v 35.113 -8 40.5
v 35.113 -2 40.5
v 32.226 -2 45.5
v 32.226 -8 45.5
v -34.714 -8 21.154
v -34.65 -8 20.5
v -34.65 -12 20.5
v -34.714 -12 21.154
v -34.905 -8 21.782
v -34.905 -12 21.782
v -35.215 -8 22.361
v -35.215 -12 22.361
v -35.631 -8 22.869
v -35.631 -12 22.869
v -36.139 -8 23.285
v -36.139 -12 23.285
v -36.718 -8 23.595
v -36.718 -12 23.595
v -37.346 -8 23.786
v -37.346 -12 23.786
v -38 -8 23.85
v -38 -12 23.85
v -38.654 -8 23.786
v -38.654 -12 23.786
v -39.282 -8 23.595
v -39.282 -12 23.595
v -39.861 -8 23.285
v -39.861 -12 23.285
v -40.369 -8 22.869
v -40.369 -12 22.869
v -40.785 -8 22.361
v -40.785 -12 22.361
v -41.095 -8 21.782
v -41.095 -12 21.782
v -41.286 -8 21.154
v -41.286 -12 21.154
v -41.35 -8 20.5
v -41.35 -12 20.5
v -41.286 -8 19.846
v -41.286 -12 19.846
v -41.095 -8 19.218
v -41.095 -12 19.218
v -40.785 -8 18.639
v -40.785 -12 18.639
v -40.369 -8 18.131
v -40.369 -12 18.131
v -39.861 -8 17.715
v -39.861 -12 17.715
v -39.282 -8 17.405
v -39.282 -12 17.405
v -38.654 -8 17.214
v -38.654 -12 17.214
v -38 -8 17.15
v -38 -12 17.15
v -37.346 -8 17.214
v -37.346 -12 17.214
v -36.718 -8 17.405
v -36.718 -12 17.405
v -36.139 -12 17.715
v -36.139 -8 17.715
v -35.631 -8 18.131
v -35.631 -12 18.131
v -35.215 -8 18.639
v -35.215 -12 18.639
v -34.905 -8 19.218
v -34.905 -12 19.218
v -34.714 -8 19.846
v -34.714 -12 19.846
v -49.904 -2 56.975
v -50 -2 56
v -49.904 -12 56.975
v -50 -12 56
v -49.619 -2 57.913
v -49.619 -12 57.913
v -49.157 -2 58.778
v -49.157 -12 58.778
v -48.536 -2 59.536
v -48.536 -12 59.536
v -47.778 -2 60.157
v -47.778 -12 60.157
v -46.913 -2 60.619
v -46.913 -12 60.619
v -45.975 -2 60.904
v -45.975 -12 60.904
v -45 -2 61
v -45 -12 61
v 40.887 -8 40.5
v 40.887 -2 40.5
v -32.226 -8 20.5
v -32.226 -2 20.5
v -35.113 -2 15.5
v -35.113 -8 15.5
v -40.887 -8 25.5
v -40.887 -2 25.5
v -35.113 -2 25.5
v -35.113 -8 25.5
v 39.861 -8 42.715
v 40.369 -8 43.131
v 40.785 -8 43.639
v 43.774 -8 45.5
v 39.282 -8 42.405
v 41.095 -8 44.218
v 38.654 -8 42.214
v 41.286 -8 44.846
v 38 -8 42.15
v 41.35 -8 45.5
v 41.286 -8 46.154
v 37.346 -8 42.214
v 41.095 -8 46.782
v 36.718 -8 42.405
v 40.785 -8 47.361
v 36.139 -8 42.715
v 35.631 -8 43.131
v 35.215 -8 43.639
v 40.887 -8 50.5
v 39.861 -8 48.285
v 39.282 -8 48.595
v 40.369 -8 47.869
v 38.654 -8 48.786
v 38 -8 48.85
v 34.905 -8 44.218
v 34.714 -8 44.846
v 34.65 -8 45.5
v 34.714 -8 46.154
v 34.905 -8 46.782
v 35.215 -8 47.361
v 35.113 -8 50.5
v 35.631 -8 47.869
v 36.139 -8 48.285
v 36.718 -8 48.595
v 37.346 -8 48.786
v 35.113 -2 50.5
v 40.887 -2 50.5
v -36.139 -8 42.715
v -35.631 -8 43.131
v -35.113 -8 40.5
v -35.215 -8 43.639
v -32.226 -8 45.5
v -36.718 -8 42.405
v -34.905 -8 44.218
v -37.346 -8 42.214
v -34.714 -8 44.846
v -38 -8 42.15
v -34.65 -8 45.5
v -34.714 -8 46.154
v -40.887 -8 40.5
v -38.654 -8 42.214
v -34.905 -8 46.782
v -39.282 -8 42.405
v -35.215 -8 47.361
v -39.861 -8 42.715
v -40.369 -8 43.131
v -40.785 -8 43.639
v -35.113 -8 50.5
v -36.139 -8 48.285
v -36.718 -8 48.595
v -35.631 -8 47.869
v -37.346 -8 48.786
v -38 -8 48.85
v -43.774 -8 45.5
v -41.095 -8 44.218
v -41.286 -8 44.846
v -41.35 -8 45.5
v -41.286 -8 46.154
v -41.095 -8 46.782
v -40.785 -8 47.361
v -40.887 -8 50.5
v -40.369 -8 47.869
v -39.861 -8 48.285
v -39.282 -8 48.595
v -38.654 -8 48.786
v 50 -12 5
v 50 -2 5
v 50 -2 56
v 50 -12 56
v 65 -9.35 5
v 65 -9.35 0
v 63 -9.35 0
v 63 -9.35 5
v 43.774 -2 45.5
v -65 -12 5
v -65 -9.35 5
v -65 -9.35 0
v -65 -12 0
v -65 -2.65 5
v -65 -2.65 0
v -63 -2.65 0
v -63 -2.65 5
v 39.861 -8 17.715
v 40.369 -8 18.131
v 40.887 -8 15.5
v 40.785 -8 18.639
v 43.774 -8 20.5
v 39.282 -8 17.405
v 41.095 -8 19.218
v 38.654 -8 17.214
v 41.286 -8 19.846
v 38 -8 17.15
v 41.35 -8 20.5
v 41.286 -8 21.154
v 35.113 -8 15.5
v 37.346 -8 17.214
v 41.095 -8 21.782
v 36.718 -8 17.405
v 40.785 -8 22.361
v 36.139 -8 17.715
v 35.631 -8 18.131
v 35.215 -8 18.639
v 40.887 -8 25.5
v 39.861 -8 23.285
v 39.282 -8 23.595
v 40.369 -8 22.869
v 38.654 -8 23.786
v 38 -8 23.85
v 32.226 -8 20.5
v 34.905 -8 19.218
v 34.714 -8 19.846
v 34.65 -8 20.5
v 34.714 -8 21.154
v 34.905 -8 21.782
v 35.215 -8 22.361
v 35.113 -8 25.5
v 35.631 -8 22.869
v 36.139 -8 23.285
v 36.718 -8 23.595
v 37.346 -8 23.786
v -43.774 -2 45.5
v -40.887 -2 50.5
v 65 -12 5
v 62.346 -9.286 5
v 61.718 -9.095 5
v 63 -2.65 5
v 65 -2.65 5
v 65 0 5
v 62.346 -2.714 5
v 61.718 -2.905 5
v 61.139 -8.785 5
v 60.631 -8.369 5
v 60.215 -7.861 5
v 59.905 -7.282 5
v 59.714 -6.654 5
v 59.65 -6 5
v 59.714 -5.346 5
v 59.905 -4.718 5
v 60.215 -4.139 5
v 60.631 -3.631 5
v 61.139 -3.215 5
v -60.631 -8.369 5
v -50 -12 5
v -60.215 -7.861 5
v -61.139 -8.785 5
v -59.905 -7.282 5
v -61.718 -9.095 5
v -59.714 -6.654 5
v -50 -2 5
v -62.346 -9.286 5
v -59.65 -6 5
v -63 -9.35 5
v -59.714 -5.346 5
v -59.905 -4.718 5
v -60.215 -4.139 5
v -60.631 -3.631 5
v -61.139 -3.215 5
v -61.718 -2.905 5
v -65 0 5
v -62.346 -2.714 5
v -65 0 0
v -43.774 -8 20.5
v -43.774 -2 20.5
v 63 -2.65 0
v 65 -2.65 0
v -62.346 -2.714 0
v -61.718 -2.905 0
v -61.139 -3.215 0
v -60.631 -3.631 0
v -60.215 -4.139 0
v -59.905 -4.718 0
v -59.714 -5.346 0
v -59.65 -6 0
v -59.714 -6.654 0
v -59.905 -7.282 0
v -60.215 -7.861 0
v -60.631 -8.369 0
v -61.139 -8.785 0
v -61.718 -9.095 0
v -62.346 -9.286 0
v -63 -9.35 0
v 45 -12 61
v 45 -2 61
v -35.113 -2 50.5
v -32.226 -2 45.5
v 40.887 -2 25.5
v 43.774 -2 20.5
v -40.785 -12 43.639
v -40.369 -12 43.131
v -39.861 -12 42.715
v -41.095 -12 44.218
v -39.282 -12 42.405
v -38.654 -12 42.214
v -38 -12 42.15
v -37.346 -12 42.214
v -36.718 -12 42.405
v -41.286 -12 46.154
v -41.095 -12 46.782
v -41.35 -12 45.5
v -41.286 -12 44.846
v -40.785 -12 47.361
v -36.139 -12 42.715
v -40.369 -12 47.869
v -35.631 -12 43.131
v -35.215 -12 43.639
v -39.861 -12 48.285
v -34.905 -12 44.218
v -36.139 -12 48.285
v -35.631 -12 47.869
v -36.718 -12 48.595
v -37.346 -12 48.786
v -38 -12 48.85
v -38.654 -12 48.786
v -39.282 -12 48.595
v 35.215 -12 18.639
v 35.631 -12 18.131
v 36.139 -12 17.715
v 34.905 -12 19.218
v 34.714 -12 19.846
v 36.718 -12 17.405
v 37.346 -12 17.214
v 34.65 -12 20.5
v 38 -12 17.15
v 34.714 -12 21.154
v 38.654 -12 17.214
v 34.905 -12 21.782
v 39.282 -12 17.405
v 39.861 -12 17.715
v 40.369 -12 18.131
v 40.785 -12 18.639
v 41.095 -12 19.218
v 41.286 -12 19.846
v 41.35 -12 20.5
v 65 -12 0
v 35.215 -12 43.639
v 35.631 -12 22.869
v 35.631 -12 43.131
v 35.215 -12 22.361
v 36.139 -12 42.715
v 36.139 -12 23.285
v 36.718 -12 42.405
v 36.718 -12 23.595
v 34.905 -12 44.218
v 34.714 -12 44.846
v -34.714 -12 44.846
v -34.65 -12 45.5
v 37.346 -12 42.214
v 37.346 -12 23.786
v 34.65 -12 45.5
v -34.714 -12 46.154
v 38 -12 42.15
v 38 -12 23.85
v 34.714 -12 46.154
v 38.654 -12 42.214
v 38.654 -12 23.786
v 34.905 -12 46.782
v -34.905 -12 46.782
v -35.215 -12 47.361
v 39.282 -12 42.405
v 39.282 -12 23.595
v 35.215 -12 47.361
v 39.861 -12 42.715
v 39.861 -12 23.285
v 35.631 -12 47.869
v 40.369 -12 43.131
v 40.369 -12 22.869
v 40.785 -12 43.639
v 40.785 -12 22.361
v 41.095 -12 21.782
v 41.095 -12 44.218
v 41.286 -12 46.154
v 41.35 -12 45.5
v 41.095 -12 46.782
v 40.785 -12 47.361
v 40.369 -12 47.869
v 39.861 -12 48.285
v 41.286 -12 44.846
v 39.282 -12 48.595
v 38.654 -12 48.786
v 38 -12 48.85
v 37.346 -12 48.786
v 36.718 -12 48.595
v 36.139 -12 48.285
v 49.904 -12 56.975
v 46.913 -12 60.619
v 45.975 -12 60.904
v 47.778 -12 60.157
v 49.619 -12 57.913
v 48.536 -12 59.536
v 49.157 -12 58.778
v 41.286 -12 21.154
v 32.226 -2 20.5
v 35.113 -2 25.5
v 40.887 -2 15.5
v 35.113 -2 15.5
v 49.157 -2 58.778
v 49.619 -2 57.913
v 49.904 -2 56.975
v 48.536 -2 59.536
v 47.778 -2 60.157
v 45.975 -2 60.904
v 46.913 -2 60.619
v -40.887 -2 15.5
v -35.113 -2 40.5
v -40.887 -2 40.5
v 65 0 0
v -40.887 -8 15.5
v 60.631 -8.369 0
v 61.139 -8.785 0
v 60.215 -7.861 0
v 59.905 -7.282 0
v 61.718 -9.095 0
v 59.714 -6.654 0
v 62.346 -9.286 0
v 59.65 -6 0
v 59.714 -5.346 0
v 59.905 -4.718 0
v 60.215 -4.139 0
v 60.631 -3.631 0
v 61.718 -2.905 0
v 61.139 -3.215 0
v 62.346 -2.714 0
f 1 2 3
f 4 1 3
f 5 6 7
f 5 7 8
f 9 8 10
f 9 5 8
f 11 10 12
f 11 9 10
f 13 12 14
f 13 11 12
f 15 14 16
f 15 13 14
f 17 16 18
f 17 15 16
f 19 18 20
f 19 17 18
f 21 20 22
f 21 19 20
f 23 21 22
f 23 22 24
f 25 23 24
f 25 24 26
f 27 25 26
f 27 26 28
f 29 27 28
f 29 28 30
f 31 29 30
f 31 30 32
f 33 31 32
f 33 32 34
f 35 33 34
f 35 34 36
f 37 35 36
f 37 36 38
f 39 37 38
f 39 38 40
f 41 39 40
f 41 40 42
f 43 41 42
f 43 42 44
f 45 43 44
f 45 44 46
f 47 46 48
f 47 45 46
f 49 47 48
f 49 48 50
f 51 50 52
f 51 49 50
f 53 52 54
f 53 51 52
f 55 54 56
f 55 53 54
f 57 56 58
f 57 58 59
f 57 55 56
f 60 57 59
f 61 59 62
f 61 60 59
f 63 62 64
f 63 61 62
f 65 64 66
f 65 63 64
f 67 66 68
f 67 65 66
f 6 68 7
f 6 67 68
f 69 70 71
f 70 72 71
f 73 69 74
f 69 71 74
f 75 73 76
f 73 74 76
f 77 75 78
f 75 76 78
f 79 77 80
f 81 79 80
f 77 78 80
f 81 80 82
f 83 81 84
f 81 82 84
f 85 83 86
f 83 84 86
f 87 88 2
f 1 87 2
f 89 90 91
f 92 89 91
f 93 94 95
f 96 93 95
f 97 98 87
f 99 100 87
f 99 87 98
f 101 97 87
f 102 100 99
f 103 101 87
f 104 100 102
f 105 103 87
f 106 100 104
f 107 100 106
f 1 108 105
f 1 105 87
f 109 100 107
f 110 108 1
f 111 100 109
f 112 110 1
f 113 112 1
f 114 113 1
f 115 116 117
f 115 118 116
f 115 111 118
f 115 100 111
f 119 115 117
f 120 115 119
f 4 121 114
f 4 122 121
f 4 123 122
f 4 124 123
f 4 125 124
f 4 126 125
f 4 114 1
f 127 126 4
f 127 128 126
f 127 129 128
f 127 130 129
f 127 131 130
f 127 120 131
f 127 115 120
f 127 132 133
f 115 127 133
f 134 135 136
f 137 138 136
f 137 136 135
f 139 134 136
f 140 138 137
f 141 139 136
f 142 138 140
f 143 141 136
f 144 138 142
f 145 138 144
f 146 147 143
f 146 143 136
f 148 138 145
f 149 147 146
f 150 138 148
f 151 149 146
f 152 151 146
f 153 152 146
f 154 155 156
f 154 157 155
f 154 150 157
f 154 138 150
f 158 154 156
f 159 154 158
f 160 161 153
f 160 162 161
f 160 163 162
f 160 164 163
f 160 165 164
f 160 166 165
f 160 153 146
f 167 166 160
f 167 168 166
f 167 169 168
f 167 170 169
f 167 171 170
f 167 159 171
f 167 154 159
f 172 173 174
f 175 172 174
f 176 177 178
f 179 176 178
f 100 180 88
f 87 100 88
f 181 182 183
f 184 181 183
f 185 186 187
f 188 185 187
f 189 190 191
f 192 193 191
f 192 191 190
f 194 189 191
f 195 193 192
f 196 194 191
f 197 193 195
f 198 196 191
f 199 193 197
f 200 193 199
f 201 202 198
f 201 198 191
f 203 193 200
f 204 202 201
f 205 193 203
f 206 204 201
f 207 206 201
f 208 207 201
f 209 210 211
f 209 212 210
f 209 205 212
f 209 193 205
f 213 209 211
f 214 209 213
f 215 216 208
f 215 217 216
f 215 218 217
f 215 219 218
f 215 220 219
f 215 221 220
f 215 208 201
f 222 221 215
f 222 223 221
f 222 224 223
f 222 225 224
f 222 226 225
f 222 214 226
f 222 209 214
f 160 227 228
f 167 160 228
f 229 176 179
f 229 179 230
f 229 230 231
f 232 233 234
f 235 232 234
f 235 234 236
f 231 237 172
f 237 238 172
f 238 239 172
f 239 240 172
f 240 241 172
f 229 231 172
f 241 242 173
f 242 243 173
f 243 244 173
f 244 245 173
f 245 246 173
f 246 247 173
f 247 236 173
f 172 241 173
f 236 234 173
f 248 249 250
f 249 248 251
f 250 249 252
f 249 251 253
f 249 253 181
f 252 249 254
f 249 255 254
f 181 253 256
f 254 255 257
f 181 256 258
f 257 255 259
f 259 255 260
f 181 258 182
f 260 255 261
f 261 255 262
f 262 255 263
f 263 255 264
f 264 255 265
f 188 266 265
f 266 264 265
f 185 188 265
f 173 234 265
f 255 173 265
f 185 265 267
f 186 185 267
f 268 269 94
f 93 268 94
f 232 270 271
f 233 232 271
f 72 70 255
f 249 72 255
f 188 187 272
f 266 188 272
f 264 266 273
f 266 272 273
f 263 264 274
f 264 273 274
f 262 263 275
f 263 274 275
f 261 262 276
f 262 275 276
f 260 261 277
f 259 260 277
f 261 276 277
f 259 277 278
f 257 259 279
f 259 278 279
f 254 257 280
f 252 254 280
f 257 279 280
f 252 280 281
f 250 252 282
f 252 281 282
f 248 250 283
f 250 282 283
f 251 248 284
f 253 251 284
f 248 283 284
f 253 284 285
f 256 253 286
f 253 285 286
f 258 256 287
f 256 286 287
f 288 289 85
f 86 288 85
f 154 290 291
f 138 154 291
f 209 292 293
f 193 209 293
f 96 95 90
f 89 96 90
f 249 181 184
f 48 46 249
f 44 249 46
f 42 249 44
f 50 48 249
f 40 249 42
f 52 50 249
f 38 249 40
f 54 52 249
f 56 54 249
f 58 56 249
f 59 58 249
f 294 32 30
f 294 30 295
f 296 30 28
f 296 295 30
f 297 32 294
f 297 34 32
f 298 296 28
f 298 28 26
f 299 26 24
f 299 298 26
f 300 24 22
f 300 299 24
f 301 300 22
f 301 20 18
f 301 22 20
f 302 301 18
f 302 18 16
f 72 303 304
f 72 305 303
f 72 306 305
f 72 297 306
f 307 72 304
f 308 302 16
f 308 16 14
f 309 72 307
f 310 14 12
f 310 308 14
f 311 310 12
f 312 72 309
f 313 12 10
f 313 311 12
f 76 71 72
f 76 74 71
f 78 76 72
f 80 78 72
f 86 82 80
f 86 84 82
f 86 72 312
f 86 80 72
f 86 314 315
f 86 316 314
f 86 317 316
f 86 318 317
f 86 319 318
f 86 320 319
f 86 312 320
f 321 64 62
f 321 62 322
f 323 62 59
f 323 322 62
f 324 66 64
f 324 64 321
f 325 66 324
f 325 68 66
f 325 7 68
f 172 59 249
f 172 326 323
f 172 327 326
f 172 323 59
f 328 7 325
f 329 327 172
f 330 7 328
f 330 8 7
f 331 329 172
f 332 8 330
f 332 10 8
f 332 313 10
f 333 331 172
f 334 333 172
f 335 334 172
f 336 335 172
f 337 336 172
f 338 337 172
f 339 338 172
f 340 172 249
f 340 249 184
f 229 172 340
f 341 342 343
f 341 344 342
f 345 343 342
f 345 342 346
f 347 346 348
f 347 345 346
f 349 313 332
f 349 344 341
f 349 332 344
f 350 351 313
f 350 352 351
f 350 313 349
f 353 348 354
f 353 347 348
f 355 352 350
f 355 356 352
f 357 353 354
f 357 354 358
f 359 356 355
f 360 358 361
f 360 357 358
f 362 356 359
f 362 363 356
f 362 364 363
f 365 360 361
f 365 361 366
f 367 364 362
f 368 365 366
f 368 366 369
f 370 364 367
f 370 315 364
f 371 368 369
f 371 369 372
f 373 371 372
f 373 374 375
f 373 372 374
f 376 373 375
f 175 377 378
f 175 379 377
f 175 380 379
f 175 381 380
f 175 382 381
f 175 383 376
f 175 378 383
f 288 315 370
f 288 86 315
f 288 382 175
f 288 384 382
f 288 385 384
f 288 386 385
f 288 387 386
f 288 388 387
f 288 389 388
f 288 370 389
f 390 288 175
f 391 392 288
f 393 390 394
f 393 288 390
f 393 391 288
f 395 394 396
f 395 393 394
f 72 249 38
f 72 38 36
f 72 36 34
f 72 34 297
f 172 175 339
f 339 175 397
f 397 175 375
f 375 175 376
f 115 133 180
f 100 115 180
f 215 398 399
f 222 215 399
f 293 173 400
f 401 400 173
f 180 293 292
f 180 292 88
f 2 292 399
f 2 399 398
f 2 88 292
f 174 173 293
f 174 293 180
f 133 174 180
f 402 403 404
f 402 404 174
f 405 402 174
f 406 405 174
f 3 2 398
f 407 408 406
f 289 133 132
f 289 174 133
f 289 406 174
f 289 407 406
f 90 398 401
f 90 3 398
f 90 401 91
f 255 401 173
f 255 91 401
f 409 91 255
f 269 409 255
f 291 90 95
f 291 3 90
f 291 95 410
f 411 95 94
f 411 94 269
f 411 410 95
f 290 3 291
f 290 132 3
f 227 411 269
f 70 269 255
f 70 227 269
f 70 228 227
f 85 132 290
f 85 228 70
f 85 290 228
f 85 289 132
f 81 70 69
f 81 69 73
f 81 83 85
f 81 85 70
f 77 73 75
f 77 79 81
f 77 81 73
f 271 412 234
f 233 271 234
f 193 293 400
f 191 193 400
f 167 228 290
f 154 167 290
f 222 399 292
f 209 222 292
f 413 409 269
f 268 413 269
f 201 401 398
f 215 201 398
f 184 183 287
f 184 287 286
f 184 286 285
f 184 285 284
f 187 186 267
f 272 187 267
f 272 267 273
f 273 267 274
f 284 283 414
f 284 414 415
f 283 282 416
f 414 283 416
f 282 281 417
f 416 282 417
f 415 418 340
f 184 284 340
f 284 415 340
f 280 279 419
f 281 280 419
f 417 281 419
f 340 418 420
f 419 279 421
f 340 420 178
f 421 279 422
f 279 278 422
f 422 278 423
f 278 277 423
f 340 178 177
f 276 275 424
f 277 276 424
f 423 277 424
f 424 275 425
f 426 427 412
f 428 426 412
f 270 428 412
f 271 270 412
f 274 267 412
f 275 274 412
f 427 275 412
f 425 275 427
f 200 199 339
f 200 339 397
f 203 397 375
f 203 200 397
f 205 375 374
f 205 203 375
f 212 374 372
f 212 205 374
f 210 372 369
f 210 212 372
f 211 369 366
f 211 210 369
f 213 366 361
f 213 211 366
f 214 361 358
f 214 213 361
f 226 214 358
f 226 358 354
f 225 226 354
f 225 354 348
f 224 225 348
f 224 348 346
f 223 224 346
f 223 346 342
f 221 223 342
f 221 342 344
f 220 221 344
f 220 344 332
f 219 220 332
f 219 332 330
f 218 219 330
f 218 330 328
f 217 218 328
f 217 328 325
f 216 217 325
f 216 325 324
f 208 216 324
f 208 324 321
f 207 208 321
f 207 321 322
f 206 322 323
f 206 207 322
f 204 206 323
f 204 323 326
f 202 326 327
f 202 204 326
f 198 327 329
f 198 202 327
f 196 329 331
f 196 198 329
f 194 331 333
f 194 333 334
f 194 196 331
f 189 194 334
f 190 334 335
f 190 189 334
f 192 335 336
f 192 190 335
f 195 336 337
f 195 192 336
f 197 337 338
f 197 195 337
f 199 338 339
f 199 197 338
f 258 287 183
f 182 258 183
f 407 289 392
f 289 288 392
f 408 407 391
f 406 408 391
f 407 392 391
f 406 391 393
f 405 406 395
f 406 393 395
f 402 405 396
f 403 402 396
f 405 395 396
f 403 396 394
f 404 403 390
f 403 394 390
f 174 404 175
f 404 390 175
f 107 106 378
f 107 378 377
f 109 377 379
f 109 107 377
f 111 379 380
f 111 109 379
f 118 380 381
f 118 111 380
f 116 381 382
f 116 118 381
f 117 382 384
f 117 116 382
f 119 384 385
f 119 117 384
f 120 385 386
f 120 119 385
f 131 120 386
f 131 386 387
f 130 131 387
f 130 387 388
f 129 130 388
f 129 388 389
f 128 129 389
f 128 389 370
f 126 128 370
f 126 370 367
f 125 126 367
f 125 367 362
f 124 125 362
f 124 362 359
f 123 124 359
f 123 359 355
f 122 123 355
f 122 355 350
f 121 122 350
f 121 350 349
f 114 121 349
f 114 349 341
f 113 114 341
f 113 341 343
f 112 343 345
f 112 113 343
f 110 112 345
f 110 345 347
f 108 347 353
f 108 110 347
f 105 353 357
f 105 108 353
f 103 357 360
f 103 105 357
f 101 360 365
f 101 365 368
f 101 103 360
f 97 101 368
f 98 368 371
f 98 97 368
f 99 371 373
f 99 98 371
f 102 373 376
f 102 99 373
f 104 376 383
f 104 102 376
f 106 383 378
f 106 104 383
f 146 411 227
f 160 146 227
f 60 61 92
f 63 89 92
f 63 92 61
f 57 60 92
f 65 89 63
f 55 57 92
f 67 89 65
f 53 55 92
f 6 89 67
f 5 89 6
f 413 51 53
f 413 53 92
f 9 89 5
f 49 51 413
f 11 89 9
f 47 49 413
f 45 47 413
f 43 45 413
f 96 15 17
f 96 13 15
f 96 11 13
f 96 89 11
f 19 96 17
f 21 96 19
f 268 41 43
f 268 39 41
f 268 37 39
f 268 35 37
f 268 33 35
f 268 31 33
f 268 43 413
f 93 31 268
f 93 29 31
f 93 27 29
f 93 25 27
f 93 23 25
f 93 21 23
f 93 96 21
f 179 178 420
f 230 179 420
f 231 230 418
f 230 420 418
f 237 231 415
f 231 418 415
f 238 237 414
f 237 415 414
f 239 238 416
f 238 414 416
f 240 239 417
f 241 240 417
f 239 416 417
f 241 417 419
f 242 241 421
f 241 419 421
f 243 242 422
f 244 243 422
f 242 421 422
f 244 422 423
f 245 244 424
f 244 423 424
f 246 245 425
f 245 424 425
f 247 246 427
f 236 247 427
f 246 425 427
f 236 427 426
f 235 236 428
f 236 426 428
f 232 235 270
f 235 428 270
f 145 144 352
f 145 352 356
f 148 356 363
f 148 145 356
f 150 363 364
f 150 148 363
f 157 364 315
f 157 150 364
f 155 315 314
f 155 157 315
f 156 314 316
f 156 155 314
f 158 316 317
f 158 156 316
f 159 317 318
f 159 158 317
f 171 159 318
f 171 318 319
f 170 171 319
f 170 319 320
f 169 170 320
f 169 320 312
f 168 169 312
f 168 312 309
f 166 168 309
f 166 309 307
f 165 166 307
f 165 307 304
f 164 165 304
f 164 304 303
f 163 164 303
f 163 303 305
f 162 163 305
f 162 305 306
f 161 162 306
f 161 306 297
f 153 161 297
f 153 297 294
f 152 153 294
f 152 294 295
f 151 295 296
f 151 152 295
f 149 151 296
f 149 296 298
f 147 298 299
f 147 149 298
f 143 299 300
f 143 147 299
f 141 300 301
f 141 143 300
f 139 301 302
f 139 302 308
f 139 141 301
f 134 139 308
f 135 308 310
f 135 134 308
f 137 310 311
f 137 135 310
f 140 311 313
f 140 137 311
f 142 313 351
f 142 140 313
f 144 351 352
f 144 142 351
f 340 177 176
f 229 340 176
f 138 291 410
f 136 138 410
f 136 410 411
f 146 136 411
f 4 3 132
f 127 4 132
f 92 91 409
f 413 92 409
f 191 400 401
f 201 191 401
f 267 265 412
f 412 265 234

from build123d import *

# Parameters (mm, degrees)
F0_R     = 3.35
F1_DEPTH = 12
F3_DEPTH = 5
F5_DEPTH = 8
F6_W     = 100
F6_H     = 56
F7_DEPTH = 2
F8_R     = 5


with BuildPart() as f1:
    # F0 (on Front) → F1 (new body)
    with BuildSketch(Plane.XZ):
        Polygon((-65, 5), (-65, 0), (65, 0), (65, 5), (50, 5), (50, 61), (-50, 61), (-50, 5), align=None)
        with Locations((-38, 20.5)):
            Circle(F0_R, mode=Mode.SUBTRACT)
        with Locations((38, 20.5)):
            Circle(F0_R, mode=Mode.SUBTRACT)
        with Locations((-38, 45.5)):
            Circle(F0_R, mode=Mode.SUBTRACT)
        with Locations((38, 45.5)):
            Circle(F0_R, mode=Mode.SUBTRACT)
    extrude(amount=F1_DEPTH)

    # F2 (on face) → F3 (cut, through all)
    with BuildSketch(Plane(origin=(0, 0, 0), x_dir=(1, 0, 0), z_dir=(0, 0, -1))):
        with BuildLine():
            Line((-65, 2.65), (-63, 2.65))
            ThreePointArc((-63, 2.65), (-59.65, 6), (-63, 9.35))
            Line((-63, 9.35), (-65, 9.35))
            Line((-65, 9.35), (-65, 2.65))
        make_face()
        with BuildLine():
            Line((65, 9.35), (63, 9.35))
            ThreePointArc((63, 9.35), (59.65, 6), (63, 2.65))
            Line((63, 2.65), (65, 2.65))
            Line((65, 2.65), (65, 9.35))
        make_face()
    extrude(amount=-F3_DEPTH, mode=Mode.SUBTRACT)

    # F4 (on face) → F5 (cut)
    with BuildSketch(Plane(origin=(0, 0, 0), x_dir=(-1, 0, 0), z_dir=(0, 1, 0))):
        Polygon((35.113249, 25.5), (32.226497, 20.5), (35.113249, 15.5), (40.886751, 15.5), (43.773503, 20.5), (40.886751, 25.5), align=None)
        Polygon((-40.886751, 25.5), (-43.773503, 20.5), (-40.886751, 15.5), (-35.113249, 15.5), (-32.226497, 20.5), (-35.113249, 25.5), align=None)
        Polygon((35.113249, 50.5), (32.226497, 45.5), (35.113249, 40.5), (40.886751, 40.5), (43.773503, 45.5), (40.886751, 50.5), align=None)
        Polygon((-40.886751, 50.5), (-43.773503, 45.5), (-40.886751, 40.5), (-35.113249, 40.5), (-32.226497, 45.5), (-35.113249, 50.5), align=None)
    extrude(amount=-F5_DEPTH, mode=Mode.SUBTRACT)

    # F6 (on face) → F7 (cut)
    with BuildSketch(Plane(origin=(0, 0, 0), x_dir=(-1, 0, 0), z_dir=(0, 1, 0))):
        with Locations((0, 33)):
            Rectangle(F6_W, F6_H)
    extrude(amount=-F7_DEPTH, mode=Mode.SUBTRACT)

    # F8
    f8_edges = [f1.edges().sort_by_distance(p)[0] for p in [
        (-50, -7, 61),
        (50, -7, 61),
    ]]
    fillet(f8_edges, radius=F8_R)


solid = f1.part
